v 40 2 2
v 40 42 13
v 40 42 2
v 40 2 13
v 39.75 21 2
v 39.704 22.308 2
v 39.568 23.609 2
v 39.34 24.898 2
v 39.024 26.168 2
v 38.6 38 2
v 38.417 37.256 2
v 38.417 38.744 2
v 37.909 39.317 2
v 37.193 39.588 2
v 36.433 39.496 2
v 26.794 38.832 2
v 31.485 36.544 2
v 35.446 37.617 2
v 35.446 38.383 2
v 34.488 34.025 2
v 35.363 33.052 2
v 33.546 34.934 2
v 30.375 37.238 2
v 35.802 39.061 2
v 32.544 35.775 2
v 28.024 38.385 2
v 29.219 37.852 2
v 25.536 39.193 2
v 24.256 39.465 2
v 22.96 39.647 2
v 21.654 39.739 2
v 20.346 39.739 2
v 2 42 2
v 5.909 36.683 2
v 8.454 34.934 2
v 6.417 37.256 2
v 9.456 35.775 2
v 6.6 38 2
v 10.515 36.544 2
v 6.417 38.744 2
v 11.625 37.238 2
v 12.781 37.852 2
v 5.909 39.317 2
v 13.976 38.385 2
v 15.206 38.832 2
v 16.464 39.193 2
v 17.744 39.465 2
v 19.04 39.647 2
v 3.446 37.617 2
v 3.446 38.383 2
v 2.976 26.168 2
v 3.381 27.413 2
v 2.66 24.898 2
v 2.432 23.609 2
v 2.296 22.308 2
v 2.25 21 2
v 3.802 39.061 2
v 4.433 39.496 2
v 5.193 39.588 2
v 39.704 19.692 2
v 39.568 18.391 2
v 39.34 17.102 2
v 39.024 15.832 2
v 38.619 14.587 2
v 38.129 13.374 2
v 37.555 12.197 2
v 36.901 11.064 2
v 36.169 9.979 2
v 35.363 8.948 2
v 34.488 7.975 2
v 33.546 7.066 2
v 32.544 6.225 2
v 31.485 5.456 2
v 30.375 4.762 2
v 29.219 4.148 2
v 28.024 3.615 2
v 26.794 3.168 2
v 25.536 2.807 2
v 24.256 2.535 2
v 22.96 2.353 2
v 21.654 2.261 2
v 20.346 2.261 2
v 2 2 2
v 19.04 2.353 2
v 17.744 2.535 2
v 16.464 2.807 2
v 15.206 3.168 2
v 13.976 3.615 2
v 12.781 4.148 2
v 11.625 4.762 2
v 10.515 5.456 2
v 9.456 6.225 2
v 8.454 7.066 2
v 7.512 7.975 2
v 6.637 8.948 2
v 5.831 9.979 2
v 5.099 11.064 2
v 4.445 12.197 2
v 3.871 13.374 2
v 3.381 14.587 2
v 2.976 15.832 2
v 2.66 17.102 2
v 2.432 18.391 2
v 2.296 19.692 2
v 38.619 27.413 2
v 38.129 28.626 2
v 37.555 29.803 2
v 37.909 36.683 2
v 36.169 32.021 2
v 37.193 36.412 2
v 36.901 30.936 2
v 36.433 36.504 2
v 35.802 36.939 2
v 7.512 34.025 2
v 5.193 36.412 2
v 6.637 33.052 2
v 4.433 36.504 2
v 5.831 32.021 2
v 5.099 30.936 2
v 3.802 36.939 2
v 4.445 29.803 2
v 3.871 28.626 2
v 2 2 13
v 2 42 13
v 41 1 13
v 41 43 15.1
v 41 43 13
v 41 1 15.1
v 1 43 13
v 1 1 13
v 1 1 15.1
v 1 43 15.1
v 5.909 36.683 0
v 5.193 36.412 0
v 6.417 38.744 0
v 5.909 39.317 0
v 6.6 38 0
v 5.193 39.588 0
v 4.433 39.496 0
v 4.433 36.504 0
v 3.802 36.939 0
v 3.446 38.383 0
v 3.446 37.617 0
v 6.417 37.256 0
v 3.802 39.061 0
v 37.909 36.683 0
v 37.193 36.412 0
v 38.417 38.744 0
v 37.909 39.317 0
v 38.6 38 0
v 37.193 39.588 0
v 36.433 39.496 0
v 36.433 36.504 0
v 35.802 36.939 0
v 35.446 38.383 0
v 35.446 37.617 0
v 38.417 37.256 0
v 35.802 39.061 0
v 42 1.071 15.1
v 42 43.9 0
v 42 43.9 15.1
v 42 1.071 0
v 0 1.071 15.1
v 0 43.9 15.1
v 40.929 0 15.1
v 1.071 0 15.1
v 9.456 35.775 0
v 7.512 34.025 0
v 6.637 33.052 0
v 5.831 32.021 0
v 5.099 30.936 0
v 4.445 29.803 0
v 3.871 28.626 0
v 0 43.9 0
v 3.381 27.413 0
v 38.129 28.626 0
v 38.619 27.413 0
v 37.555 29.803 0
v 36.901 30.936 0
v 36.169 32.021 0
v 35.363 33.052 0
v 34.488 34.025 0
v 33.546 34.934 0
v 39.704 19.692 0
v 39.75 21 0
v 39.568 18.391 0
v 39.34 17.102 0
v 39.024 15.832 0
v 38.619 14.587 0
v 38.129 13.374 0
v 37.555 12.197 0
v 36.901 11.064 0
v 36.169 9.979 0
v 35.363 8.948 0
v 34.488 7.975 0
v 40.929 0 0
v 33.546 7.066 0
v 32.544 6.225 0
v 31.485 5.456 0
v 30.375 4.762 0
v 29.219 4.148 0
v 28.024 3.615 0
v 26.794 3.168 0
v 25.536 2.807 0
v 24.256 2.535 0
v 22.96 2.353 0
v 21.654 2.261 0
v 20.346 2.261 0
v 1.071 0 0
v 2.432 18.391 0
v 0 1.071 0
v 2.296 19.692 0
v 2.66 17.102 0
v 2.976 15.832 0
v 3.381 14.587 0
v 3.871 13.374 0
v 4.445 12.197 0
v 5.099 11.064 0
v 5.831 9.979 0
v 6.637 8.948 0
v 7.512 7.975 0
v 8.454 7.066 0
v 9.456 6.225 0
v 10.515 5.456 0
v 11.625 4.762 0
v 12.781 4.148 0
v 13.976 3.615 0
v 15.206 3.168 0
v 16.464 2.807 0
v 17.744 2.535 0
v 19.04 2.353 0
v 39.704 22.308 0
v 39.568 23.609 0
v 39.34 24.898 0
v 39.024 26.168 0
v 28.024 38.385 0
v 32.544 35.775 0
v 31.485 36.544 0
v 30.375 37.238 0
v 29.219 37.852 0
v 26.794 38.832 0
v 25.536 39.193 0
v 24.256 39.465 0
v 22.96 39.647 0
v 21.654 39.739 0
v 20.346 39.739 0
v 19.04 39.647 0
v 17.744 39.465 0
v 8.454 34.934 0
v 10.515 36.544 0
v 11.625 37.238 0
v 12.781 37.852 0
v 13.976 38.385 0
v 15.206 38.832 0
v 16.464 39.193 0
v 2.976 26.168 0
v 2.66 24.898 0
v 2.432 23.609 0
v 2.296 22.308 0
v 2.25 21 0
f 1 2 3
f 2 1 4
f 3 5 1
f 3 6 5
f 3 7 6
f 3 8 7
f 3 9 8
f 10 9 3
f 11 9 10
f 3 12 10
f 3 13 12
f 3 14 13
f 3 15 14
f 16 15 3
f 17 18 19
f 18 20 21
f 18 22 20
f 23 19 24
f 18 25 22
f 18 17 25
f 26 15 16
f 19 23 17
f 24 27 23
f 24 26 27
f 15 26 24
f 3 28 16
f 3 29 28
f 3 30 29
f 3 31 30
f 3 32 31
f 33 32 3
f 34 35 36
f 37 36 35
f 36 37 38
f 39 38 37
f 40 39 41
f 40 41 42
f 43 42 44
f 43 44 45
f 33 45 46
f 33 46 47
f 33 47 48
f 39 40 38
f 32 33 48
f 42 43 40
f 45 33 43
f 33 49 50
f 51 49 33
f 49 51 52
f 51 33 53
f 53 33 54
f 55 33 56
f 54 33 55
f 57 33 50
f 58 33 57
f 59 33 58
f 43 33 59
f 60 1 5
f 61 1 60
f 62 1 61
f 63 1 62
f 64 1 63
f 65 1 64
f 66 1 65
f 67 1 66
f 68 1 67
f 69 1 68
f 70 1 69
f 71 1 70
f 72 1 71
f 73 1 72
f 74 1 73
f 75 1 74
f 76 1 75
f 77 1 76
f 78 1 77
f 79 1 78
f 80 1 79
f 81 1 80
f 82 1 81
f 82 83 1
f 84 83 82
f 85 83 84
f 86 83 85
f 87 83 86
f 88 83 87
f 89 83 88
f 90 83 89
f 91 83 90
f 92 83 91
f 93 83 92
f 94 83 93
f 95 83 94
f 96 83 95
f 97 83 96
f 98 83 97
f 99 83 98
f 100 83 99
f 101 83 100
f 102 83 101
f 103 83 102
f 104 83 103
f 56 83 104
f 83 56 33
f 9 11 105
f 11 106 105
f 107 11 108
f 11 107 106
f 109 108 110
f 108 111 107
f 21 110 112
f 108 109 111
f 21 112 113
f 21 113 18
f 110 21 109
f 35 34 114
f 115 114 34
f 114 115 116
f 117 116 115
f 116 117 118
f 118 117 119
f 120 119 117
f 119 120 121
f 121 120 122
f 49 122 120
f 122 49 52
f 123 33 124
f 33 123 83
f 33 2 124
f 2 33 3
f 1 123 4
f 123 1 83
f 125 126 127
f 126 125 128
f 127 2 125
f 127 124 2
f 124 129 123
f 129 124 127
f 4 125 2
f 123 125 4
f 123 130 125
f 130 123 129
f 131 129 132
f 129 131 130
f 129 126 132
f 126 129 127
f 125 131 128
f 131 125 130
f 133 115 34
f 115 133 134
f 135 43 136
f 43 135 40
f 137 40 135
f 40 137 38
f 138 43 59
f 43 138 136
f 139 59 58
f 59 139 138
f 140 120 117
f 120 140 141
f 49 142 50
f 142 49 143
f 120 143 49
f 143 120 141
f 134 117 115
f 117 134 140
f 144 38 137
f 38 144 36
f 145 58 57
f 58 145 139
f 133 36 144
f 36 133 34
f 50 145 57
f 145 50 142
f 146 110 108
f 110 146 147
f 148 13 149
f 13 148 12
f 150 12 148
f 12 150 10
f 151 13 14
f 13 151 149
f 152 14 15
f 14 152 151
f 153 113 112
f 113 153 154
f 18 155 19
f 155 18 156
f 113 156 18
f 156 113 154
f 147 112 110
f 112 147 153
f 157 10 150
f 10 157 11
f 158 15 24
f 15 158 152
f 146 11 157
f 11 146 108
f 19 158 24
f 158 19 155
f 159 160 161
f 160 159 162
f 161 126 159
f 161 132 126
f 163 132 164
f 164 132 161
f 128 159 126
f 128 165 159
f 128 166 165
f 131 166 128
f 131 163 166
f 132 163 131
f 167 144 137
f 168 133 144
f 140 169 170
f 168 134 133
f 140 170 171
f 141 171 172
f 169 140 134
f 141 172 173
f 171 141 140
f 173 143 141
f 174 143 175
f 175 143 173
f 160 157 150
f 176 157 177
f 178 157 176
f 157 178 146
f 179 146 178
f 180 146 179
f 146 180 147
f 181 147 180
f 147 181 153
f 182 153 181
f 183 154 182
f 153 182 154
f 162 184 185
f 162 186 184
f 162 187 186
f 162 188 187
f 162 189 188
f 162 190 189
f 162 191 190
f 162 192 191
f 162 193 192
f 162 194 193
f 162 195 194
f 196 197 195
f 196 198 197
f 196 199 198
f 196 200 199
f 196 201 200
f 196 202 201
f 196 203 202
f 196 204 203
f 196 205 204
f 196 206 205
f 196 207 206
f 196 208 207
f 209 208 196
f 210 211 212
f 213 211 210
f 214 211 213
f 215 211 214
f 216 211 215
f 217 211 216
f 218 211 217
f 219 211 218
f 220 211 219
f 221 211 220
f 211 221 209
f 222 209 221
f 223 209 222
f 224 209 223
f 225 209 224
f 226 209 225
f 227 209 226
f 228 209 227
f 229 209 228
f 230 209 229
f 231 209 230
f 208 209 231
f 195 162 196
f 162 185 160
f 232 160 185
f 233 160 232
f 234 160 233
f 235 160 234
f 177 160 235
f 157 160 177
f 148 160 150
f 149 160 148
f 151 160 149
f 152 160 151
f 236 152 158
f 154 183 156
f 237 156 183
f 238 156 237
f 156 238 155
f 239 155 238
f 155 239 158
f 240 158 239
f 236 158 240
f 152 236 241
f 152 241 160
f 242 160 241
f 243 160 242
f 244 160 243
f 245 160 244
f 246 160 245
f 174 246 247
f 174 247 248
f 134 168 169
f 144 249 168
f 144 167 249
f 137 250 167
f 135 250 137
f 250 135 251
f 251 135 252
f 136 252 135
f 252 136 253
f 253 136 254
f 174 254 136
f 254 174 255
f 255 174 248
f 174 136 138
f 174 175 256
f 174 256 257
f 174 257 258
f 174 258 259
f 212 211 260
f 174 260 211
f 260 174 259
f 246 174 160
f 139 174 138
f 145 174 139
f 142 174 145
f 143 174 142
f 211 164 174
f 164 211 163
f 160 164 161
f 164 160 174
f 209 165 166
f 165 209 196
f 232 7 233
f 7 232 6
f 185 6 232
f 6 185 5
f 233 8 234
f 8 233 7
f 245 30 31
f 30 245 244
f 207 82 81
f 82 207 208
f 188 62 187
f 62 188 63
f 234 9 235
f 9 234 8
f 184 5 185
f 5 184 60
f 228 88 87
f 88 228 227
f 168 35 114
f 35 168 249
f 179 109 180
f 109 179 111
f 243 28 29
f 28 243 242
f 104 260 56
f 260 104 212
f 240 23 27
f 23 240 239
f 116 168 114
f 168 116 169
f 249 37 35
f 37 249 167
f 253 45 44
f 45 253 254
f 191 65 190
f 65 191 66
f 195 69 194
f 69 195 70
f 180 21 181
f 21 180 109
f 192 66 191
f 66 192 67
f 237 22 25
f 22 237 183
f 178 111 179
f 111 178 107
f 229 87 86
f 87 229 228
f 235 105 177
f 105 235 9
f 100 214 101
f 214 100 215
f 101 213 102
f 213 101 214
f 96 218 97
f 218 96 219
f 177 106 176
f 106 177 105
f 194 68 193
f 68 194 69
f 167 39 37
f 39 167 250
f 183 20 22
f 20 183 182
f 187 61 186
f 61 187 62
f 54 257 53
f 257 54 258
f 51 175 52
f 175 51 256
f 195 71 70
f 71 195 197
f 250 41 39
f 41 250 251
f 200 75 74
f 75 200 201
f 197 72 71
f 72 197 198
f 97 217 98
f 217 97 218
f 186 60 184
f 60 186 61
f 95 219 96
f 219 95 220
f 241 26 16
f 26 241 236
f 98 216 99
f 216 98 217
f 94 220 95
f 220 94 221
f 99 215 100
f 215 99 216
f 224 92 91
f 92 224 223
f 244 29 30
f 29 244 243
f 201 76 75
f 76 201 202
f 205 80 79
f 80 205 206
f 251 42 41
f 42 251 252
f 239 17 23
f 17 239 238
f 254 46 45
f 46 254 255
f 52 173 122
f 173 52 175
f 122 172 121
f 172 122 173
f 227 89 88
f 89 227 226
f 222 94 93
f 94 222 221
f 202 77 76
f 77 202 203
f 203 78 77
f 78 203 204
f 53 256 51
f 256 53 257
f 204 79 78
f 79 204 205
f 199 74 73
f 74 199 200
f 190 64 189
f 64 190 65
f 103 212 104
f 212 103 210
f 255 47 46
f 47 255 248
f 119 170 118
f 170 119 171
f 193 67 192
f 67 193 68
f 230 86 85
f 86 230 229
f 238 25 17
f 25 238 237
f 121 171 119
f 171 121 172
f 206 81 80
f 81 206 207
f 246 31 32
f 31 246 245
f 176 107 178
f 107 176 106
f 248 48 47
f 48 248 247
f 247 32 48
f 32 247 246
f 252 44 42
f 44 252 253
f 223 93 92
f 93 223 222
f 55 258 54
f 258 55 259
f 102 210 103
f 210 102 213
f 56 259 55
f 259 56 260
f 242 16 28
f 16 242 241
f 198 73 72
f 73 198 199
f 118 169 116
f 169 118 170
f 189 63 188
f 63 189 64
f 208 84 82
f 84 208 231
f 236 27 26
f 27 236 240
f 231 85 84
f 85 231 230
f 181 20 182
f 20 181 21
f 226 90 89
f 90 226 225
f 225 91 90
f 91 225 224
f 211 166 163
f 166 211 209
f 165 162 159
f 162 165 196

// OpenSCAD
$fs=0.8; // def 1, 0.2 is high res
$fa=4;//def 12, 3 is very nice
%translate([0,0,-0.5])cube([200,200,1],center=true); //build platform

sc = 32; //Screw Centres
wall=2;
hole = 37.5;  //fan hole
x=42;
y=x;
z=15.10;
heo = 2.5; //hot end offset
hbr = 16; //heat block recess

ventB=(x/2)-(hbr/2)+heo-2;
ventS=(x/2)-(hbr/2)-heo;

module sensorMount() {
	difference() {
		union() {
			translate([-3,y-5.5,9]) rotate([0,90,0]) cylinder(4,3,6);	// sensor board mount
			translate([-3,y-28.5,9]) rotate([0,90,0]) cylinder(4,3,6);	// sensor board mount	
		}
		translate([-4,y-5.5,9]) rotate([0,90,0]) cylinder(h=5,r=1.2);	// sensor board hole
		translate([-4,y-28.5,9]) rotate([0,90,0]) cylinder(h=5,r=1.2);	// sensor board hole
	}
}

module heatsink() 
{
	cube([38, 40, 12]); //heatsink hole
	translate([-1,-1,11]) cube([40, 42, 3]); //heatsink recess
	translate([3,36,-2.1]) cylinder(3,1.6,1.6); //screw hole
	translate([35,36,-2.1]) cylinder(3,1.6,1.6); //screw hole
}

module prism(l, w, h) {
	translate([0, l, 0]) rotate( a= [90, 0, 0]) 
	linear_extrude(height = l) polygon(points = [
		[0, 0],
		[w, 0],
		[0, h]
	], paths=[[0,2,1]]);
}

module vHole(len) {
	difference() {
		union() {
			cube([10-6,len,6]);
			translate([10-6,len,6]) rotate([90,0,0]) cylinder(len,6,6);
		}
		translate ([-7,-1,6]) cube([16,len+2,10]);
		translate ([-7,-1,0]) cube([6,len+2,7]);
	}
}

//Body
difference() {
	cube([x,y+1.9,z]); //outer block
	
	translate([x/2,(y/2),-.1]) cylinder(5,hole/2,hole/2); //fan hole
	translate([wall,wall,2]) heatsink();

	translate([0,-6,-1]) rotate([0,0,45]) cube([5,5,z+2]); // top bevel
	translate([x,-6,-1]) rotate([0,0,45]) cube([5,5,z+2]); //top bevel

}

/*/*Cable Traps
translate([x,(y/2)-10,0]) cube([wall*2,20,1.5]); //right cable trap
difference() {
	translate([x+3,(y/2)-10,0]) cube([1.5,20,z]); //right cable trap
	translate([x+2,(y/2)-10,z-2]) rotate([45,0,0]) cube(3); //right cable trap bevel
	translate([x+2,y-11,z-2]) rotate([45,0,0]) cube(3); //right cable trap bevel
}
translate([x+1.6,(y/2)-7.5,z-1.5]) rotate([0,45,0]) cube([2,15,2]); //right cable trap catch

//Tie Wrap T
translate([x/2-2.5,-6,0]) cube([5,6,2]);
translate([x/2-4,-6,0]) cube([8,2,2]);
*/

//sensorMount() ;
